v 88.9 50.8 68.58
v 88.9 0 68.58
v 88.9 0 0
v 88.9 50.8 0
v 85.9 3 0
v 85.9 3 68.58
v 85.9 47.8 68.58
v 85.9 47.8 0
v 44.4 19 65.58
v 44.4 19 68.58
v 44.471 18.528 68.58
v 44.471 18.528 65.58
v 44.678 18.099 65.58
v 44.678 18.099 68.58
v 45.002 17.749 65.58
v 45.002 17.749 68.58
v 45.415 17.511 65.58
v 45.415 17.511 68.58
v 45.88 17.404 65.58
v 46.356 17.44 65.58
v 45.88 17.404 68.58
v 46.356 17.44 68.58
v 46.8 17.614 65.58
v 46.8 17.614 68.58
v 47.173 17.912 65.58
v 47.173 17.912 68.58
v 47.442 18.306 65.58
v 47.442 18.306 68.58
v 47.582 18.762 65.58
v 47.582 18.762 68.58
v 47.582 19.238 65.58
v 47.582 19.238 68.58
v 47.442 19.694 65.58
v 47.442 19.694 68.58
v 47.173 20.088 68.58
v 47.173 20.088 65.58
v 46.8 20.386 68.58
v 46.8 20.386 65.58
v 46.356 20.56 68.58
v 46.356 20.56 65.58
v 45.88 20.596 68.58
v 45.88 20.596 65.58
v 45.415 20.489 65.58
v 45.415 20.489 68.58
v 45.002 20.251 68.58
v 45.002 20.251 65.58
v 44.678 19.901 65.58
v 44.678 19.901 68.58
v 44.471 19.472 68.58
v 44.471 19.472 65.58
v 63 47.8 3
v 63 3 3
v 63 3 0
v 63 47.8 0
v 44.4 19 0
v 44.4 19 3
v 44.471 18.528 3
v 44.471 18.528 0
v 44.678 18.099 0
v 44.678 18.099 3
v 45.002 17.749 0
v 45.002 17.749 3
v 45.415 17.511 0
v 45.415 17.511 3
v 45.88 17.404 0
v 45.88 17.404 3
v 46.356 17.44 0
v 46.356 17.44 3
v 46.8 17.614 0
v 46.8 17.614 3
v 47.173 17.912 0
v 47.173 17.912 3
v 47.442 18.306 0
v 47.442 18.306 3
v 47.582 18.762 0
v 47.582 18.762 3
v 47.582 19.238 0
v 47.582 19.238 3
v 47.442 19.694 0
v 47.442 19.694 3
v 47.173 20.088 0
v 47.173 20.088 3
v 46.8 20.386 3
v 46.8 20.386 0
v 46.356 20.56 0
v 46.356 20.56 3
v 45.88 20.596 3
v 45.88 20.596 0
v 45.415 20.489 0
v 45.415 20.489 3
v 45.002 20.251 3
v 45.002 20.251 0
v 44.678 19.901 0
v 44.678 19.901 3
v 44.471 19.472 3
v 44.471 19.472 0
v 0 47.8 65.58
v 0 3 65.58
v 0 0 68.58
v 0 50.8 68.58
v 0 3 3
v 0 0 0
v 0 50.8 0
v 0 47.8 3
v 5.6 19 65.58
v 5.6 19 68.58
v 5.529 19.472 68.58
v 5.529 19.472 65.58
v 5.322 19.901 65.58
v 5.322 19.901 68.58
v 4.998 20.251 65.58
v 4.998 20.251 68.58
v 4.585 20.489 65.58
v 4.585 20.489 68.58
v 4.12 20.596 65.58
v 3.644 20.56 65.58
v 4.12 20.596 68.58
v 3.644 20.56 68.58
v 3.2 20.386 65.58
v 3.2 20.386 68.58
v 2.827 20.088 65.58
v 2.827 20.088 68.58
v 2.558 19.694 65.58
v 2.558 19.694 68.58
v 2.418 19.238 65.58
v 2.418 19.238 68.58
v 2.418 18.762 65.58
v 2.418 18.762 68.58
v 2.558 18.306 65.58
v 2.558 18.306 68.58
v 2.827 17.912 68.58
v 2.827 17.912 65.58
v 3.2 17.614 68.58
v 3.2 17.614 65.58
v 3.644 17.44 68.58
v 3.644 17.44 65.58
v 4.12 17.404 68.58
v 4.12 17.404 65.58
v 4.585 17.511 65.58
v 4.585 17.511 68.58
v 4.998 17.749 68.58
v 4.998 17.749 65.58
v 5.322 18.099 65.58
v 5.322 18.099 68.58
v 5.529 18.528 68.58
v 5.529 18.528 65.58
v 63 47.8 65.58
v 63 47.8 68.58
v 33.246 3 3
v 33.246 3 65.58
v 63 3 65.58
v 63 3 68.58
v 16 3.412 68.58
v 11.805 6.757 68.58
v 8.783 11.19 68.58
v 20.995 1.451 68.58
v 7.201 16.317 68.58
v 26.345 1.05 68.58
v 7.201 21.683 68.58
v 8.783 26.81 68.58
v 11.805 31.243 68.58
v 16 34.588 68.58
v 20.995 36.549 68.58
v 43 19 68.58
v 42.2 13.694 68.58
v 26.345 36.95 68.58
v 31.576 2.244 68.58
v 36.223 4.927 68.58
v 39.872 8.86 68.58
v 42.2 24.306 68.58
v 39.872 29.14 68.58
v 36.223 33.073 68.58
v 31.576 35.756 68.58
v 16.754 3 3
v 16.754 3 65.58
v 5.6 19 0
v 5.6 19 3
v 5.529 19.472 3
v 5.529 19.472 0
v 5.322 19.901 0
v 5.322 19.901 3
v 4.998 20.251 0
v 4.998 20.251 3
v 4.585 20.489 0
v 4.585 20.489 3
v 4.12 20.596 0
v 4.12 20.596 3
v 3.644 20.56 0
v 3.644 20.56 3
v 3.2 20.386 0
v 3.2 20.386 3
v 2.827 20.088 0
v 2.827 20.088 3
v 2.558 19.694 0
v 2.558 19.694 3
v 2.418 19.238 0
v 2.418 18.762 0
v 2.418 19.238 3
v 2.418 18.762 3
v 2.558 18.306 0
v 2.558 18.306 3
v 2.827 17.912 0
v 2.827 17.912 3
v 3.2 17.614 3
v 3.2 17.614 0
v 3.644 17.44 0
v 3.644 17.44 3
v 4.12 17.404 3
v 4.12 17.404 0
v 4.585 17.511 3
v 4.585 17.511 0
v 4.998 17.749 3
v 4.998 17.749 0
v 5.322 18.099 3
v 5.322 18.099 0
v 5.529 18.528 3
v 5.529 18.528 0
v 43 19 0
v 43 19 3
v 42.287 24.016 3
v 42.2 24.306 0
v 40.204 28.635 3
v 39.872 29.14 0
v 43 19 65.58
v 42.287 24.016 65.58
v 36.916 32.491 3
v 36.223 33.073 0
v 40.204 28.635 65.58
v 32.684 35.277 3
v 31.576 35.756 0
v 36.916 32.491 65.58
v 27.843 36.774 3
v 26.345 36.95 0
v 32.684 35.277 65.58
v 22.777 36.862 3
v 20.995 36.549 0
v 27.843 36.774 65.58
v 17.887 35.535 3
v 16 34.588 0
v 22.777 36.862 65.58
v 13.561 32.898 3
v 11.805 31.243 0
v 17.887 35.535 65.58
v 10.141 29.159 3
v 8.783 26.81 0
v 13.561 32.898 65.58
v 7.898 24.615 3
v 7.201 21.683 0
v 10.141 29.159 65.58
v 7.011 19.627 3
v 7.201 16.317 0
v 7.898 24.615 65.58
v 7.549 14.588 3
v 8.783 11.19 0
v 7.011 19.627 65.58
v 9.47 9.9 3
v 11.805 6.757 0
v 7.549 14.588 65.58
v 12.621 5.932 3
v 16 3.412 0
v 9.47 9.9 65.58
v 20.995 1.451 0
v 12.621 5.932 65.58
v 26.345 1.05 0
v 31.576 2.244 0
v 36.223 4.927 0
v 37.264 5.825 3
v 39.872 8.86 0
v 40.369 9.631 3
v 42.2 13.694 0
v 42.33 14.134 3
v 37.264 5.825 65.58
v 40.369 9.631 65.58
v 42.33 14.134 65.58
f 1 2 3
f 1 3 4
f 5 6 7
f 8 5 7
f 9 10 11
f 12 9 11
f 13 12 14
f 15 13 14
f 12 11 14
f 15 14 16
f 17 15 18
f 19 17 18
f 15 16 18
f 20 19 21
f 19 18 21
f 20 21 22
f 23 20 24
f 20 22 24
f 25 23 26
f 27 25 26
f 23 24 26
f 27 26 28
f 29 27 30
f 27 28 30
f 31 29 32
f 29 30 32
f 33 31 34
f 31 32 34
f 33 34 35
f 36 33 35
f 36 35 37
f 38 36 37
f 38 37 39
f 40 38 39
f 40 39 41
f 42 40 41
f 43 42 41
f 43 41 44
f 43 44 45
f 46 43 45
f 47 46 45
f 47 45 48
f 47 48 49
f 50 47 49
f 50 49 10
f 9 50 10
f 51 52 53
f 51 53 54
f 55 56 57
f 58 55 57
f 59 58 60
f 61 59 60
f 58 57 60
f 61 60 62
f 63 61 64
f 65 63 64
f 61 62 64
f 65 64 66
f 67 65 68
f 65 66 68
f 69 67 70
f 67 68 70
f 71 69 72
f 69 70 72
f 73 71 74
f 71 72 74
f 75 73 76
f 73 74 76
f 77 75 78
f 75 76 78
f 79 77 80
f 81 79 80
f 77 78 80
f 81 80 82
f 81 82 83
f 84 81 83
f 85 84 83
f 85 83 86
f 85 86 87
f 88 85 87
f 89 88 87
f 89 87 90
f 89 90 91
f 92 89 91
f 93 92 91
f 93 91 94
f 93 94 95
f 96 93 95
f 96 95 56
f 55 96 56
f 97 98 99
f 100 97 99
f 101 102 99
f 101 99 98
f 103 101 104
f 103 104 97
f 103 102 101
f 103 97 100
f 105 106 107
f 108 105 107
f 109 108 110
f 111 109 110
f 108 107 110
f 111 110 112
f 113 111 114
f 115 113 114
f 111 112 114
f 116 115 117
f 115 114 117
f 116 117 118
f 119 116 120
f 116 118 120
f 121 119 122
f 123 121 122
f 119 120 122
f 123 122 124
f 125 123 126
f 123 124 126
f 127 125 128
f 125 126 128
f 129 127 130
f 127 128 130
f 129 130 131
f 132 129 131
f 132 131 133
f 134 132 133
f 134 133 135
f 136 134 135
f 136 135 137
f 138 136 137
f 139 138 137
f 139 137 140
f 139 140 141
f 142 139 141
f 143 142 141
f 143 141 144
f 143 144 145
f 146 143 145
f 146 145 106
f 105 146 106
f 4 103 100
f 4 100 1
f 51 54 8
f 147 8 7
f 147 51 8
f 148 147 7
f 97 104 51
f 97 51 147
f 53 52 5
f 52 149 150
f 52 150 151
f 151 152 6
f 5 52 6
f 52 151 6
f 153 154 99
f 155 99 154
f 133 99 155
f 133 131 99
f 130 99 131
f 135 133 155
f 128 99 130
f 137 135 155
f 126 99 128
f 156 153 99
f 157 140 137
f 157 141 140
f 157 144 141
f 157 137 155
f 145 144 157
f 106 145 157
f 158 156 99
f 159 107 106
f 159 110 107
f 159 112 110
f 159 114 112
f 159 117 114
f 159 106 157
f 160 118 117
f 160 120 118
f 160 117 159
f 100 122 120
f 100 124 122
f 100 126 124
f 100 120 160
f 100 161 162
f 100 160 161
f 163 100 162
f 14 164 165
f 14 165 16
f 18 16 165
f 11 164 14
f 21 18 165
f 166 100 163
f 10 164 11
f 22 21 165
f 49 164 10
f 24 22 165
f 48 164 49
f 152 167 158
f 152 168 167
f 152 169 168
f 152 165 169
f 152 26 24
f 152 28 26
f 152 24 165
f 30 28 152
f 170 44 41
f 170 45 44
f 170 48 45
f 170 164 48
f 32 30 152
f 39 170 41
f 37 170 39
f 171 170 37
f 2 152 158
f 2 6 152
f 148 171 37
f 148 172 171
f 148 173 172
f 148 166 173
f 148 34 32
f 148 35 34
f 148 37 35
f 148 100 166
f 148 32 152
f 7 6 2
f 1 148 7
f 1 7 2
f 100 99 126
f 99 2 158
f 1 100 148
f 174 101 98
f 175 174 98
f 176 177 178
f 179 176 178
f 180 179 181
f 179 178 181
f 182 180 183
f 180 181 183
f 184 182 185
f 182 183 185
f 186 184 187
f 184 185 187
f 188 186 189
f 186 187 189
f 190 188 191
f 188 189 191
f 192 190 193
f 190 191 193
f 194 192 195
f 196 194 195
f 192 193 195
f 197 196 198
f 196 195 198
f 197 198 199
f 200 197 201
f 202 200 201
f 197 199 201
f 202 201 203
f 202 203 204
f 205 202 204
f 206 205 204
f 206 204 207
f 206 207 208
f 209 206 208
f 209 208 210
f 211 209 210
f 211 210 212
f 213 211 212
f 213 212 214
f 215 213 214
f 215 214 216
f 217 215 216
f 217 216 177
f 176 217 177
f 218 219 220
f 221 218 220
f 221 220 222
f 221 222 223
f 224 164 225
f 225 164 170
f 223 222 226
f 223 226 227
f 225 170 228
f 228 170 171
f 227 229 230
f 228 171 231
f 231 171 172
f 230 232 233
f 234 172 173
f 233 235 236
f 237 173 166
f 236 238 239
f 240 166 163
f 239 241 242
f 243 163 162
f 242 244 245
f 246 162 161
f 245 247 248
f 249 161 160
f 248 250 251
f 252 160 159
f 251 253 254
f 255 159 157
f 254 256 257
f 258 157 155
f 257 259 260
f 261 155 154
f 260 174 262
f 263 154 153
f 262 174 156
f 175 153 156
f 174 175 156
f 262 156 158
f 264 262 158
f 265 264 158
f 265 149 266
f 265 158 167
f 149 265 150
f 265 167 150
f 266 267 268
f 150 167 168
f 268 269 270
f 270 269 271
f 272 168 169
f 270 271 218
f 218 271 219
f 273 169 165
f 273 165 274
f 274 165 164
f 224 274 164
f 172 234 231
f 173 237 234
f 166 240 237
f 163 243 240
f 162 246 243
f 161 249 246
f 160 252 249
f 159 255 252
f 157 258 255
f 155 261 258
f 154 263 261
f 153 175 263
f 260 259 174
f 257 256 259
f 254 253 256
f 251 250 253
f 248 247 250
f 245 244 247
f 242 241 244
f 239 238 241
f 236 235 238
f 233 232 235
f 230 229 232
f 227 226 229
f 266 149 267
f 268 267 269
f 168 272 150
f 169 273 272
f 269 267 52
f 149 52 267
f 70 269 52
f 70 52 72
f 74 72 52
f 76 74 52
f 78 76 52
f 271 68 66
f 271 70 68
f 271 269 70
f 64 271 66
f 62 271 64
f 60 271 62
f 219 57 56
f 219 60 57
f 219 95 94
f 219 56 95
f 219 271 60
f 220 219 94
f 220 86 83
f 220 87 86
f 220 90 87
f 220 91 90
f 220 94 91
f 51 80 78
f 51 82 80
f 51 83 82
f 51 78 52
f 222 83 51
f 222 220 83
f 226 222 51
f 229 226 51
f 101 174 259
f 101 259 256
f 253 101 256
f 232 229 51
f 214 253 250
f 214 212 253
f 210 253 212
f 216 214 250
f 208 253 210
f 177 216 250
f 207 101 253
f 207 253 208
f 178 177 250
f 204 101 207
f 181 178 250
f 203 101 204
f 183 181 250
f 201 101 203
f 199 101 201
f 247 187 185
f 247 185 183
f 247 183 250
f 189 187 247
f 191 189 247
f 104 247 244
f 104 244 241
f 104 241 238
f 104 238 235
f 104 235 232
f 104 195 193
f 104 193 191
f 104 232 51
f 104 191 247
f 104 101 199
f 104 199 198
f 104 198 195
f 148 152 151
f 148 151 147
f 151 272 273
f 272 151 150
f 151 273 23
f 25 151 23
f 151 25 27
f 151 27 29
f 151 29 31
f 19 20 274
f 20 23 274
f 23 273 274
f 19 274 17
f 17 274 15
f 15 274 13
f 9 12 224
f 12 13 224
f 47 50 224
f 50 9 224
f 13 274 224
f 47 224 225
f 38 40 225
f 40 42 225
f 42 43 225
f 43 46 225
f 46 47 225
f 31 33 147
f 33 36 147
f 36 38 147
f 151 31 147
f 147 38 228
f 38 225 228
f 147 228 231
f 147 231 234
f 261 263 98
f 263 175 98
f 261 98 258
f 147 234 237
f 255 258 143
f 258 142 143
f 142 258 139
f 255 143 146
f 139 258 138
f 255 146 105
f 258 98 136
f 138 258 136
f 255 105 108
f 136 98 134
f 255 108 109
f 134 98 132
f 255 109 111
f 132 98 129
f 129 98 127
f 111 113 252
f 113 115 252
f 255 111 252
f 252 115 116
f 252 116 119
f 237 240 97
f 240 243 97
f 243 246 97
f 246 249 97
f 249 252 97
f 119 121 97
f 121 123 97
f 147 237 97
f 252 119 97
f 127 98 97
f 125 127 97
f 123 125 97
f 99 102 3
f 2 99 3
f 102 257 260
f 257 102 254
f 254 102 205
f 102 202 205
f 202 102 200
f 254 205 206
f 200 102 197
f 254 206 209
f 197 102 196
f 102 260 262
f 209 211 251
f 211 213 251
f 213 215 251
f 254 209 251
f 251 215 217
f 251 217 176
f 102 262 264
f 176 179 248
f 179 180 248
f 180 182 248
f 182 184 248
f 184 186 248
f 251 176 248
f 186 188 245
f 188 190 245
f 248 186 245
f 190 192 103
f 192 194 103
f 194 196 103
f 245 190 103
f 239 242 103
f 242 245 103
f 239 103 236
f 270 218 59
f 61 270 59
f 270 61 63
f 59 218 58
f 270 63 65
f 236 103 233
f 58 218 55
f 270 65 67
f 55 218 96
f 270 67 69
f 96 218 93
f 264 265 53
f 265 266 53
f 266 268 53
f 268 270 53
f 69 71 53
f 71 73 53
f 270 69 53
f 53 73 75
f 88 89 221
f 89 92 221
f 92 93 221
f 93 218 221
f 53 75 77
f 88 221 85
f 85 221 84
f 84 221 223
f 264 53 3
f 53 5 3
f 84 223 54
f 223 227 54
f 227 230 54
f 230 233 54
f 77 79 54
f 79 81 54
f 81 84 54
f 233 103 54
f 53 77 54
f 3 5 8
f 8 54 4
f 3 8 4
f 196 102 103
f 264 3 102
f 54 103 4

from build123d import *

# Parameters (mm, degrees)
SKETCH1_W           = 88.9
SKETCH1_H           = 50.8
BOSS_EXTRUDE1_DEPTH = 68.58
SHELL10_T           = 3
SKETCH2_R           = 18
SKETCH2_R_2         = 1.6
SKETCH2_W           = 22.9
SKETCH2_H           = 44.8
CUT_EXTRUDE1_DEPTH  = 69
SKETCH4_W           = 62.58
SKETCH4_H           = 44.8
CUT_EXTRUDE2_DEPTH  = 10


with BuildPart() as part:
    # Sketch1 → Boss-Extrude1 (new body)
    with BuildSketch(Plane.XY):
        with Locations((44.45, 25.4)):
            Rectangle(SKETCH1_W, SKETCH1_H)
    extrude(amount=BOSS_EXTRUDE1_DEPTH)

    # Shell10 (no face opened: a closed hollow body)
    add(offset(amount=-SHELL10_T, mode=Mode.PRIVATE), mode=Mode.SUBTRACT)

    # Sketch2 → Cut-Extrude1 (cut)
    with BuildSketch(Plane.XY.offset(68.58)):
        with Locations((25, 19)):
            Circle(SKETCH2_R)
        with Locations((4, 19)):
            Circle(SKETCH2_R_2)
        with Locations(Location((46, 19, 0), (0, 0, 180))):
            Circle(SKETCH2_R_2)
        with Locations((74.45, 25.4)):
            Rectangle(SKETCH2_W, SKETCH2_H)
    extrude(amount=-CUT_EXTRUDE1_DEPTH, mode=Mode.SUBTRACT)

    # Sketch4 → Cut-Extrude2 (cut)
    with BuildSketch(Plane.ZY):
        with Locations((34.29, 25.4)):
            Rectangle(SKETCH4_W, SKETCH4_H)
    extrude(amount=-CUT_EXTRUDE2_DEPTH, mode=Mode.SUBTRACT)


solid = part.part
